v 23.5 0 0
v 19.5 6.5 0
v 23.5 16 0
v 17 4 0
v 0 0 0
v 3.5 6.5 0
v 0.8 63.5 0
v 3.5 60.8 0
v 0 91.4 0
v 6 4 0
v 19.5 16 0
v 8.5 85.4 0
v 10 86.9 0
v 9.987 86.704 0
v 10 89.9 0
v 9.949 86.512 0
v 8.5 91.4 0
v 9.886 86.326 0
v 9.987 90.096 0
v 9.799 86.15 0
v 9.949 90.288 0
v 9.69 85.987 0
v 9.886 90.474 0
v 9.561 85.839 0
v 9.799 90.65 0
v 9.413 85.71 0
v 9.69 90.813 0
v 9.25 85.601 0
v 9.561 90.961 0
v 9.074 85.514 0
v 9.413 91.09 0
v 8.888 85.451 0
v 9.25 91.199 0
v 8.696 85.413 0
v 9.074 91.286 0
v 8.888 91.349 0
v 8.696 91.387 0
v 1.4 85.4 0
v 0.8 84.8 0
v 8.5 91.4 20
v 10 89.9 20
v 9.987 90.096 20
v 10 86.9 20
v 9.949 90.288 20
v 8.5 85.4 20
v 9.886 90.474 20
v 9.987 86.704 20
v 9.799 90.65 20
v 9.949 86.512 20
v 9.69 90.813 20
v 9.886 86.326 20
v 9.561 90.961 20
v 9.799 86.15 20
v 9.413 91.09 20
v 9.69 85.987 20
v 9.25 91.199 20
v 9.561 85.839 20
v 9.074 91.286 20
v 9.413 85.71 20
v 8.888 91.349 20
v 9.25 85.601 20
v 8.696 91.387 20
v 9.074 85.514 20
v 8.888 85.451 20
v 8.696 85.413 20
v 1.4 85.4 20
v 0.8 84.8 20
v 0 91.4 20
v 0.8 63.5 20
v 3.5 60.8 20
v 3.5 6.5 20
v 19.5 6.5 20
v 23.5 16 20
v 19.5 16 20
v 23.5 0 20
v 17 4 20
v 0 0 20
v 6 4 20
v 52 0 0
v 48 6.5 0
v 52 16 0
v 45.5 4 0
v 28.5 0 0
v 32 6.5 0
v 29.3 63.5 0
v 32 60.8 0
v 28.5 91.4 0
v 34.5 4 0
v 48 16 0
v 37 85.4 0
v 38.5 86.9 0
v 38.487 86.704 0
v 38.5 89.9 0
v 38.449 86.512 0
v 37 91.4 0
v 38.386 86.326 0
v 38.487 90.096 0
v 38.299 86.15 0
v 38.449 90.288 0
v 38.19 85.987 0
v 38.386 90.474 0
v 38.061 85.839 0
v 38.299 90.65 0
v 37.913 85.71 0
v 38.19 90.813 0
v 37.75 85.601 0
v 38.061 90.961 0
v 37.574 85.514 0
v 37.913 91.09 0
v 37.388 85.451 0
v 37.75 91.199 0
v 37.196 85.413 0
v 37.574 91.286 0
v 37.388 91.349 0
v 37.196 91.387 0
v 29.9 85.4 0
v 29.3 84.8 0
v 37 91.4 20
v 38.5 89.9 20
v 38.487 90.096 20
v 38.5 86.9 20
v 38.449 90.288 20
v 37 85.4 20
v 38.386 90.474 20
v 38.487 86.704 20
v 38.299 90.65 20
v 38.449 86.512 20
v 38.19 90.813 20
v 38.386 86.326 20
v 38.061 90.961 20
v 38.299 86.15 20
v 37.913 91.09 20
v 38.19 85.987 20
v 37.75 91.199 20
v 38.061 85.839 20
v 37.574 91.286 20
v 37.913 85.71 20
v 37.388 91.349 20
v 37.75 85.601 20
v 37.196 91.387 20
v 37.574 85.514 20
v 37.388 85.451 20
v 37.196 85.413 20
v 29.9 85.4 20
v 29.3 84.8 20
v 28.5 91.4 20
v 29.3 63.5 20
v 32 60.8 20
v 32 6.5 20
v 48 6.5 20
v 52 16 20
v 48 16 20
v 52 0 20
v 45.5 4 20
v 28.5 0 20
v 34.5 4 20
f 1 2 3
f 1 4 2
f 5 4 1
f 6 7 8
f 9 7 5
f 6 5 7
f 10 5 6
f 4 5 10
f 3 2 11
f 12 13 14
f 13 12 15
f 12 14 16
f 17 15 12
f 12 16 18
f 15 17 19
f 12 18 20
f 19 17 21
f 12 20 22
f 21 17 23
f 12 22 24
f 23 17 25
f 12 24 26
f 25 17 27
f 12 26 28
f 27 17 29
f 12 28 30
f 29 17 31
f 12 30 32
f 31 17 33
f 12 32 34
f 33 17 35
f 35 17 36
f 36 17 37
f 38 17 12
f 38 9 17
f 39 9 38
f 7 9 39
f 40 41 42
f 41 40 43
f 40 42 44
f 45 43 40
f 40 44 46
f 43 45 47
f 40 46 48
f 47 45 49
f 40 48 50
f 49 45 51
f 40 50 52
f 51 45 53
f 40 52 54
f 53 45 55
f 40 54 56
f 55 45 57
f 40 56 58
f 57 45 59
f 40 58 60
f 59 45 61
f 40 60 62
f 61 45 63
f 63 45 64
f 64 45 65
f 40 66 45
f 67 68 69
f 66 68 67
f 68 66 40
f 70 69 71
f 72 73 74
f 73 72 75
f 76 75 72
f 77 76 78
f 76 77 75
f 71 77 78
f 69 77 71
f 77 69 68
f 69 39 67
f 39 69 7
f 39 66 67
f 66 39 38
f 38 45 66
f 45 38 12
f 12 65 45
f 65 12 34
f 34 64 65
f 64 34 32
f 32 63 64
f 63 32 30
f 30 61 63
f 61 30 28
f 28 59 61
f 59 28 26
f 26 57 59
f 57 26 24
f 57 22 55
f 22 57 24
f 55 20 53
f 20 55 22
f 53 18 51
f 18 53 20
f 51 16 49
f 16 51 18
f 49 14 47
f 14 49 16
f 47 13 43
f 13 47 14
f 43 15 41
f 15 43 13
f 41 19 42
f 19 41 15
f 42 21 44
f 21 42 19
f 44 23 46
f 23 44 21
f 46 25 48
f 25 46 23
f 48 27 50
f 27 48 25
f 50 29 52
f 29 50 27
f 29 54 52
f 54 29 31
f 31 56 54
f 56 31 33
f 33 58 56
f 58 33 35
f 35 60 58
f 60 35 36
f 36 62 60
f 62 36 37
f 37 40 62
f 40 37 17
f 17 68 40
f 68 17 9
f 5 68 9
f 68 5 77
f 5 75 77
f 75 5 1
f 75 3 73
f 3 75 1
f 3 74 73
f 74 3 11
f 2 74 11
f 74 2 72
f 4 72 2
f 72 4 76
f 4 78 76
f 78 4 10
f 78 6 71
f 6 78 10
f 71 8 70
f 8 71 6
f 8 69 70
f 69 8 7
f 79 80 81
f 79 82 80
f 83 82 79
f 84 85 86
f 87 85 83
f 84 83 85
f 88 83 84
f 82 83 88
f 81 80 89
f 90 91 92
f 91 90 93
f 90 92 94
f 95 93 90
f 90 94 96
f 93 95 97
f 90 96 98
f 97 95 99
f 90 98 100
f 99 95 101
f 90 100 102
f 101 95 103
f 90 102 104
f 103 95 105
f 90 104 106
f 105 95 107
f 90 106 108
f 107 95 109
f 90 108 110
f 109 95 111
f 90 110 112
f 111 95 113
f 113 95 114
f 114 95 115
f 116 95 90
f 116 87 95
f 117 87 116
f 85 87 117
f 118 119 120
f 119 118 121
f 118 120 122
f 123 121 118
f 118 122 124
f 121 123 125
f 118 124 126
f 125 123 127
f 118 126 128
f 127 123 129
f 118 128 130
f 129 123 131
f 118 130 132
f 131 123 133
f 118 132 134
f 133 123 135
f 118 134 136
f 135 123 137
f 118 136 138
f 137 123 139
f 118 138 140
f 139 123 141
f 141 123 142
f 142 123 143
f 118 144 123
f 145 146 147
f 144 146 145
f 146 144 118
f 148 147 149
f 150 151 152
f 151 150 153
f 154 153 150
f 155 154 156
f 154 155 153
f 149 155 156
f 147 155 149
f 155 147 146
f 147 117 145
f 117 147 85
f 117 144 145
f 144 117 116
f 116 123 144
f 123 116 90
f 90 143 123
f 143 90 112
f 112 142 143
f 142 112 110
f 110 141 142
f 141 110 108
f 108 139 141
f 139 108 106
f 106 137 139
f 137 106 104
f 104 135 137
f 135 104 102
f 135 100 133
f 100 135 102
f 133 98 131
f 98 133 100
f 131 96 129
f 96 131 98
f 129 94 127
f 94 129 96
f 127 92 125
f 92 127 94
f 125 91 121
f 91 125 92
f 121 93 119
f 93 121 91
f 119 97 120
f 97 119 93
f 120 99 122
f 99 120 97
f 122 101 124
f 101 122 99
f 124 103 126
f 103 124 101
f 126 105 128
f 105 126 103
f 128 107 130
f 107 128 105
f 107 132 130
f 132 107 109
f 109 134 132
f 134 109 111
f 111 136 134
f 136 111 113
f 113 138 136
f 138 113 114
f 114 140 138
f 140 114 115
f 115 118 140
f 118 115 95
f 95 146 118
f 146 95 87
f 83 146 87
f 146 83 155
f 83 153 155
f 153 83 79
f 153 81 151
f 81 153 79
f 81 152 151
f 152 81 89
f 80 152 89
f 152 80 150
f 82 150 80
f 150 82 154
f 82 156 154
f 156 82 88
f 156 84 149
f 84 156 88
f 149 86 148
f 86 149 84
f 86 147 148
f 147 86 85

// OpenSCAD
// =============================================================================
//  whiteboard_hanger.scad — Crochet pour suspendre un tableau blanc sous une
//                           tablette appuyée contre un mur
//  Unités : millimètres
// =============================================================================
//
//  Profil (vue de côté, mur à gauche, X = vers la pièce, Y = vers le haut) :
//
//        ┌──────────────┐  ← languette posée SUR la tablette (tab_len, tab_t)
//        │┌─────────────┴──────── tablette ───
//        ││  (shelf_t)
//        ││  ← bande mince (strip_t = 0.8) coincée entre mur et tablette
//        │└─────────────────────────────────
//        │ \  ← rampe à 45° : la bande s'épaissit SOUS la tablette
//        │  │
//        │  │  ← descente (drop_len, épaisseur below_t)
//        │  │
//        │  │ ┌─┐ ← lèvre (lip_h)
//        │  │ │ │
//        │  └─┘ │ ← fond du crochet : le haut du tableau repose ici
//        └──────┘   (largeur intérieure = board_t + board_clear)
//       mur
//
//  Tout est orthogonal (pas de courbes), avec de petits goussets à 45°
//  (fillet) dans les angles intérieurs pour la solidité.
//
//  IMPRESSION : couché sur le côté — le PROFIL est à plat sur le plateau et
//  la pièce est extrudée vers le haut sur `width` mm. Les lignes de couche
//  sont alors parallèles au profil : aucun pli ne se fend entre deux couches.
//  part = "print" exporte la pièce dans cette orientation (count exemplaires).
//  part = "preview" la montre en place, avec mur, tablette et tableau fantômes.
// =============================================================================

part  = "print";   // "print" = à plat, prêt à trancher ; "preview" = en place
count = 2;         // nombre d'exemplaires sur le plateau (mode print)

// ── Pièce ────────────────────────────────────────────────────────────────────
width       = 20;    // largeur du crochet (= hauteur d'impression)

// Bande contre le mur
strip_t     = 0.8;   // épaisseur de la partie coincée entre mur et tablette
                     // (≥ 2 lignes d'extrusion avec une buse de 0.4)

// Tablette et languette du haut
shelf_t     = 21.4;  // épaisseur de la tablette = longueur de la bande mince
                     // (25.4 au départ : la bande dépassait de 4 mm)
shelf_clear = 0.5;   // jeu vertical : la partie épaisse commence ce jeu sous la tablette
tab_len     = 10;    // longueur du bloc posé sur la tablette (depuis le mur) :
                     // il suffit qu'il accroche le bois
tab_t       = 6.0;   // hauteur du bloc : court et épais pour ne pas plier
                     // (2 mm × 25 mm se déformait sous la charge)
tab_lip_h   = 0;     // rebord descendant au bout de la languette (0 = aucun).
                     // Pour enserrer l'avant de la tablette :
                     //   tab_len = strip_t + profondeur de la tablette + jeu + tab_t

// Descente et crochet du bas
drop_len    = 60;    // du dessous de la tablette au fond intérieur du crochet
below_t     = 3.5;   // épaisseur de la bande sous la tablette (rigidité)
board_t     = 15;    // épaisseur du tableau (ou de son cadre)
board_clear = 1.0;   // jeu entre le tableau et la lèvre
hook_t      = 4.0;   // épaisseur du fond et de la lèvre du crochet
lip_h       = 12;    // hauteur de la lèvre (au-dessus du fond intérieur)

// Renforts
fillet      = 2.5;   // gousset à 45° dans les angles intérieurs du crochet et
                     // de la descente (0 = angles vifs)
top_fillet  = 0.6;   // gousset entre la bande mince et le bloc du haut. Il loge
                     // dans l'arête arrière-haut de la tablette : celle-ci doit
                     // être adoucie/poncée d'au moins cette valeur (sinon 0)
tab_round   = 1.5;   // rayon des deux arêtes avant du bloc du haut

// ── Fantômes (aperçu seulement) ───────────────────────────────────────────────
shelf_depth = 250;   // profondeur de la tablette
board_h     = 200;   // hauteur du tableau montrée dans l'aperçu
ghost_len   = 120;   // longueur des fantômes le long du mur

// ── Cotes dérivées (profil 2D) ────────────────────────────────────────────────
y_thin_bot = -(shelf_t + shelf_clear);          // fin de la partie mince
y_ramp_bot = y_thin_bot - (below_t - strip_t);  // fin de la rampe à 45°
y_floor    = -(shelf_t + drop_len);             // fond intérieur du crochet
y_floor_bot= y_floor - hook_t;
x_lip_in   = below_t + board_t + board_clear;
x_lip_out  = x_lip_in + hook_t;
y_lip_top  = y_floor + lip_h;

assert(below_t >= strip_t, "below_t doit être ≥ strip_t");
assert(y_floor < y_ramp_bot - fillet,
       "drop_len trop court : augmenter drop_len ou réduire shelf_clear/below_t");
assert(tab_len >= strip_t + tab_t, "tab_len trop court");

// ── Profil ───────────────────────────────────────────────────────────────────
module rect(x0, y0, x1, y1) translate([x0, y0]) square([x1 - x0, y1 - y0]);

// gousset triangulaire dans un angle intérieur ; sx, sy = sens des deux bras
module gusset(x, y, s, sx, sy)
    if (s > 0) polygon([[x, y], [x + sx * s, y], [x, y + sy * s]]);

// bloc du haut : rectangle dont les deux arêtes avant (haut et bas, celle
// du bas touche la tablette) sont arrondies
module knob_profile() {
    r = min(tab_round, tab_t / 2, tab_len);
    if (r <= 0) rect(0, 0, tab_len, tab_t);
    else hull() {
        rect(0, 0, tab_len - r, tab_t);
        for (y = [r, tab_t - r])
            translate([tab_len - r, y]) circle(r = r, $fn = 48);
    }
}

module profile() {
    union() {
        // languette du haut, posée sur la tablette
        // bloc du haut, posé sur la tablette, arêtes avant arrondies
        knob_profile();
        if (tab_lip_h > 0) rect(tab_len - tab_t, -tab_lip_h, tab_len, 0);
        // bande mince entre mur et tablette
        rect(0, y_thin_bot, strip_t, 0);
        // rampe à 45° vers l'épaisseur below_t
        polygon([[0, y_thin_bot], [strip_t, y_thin_bot],
                 [below_t, y_ramp_bot], [0, y_ramp_bot]]);
        // descente
        rect(0, y_floor_bot, below_t, y_ramp_bot);
        // fond et lèvre du crochet
        rect(0, y_floor_bot, x_lip_out, y_floor);
        rect(x_lip_in, y_floor_bot, x_lip_out, y_lip_top);

        // renforts
        gusset(below_t,  y_floor,  fillet,  1, 1);   // descente / fond
        gusset(x_lip_in, y_floor,  fillet, -1, 1);   // fond / lèvre
        gusset(strip_t,  0,        top_fillet,  1, -1);  // bande / languette
        if (tab_lip_h > 0)
            gusset(tab_len - tab_t, 0, top_fillet, -1, -1); // languette / rebord
    }
}

module hanger() linear_extrude(height = width) profile();

// ── Mise en place ─────────────────────────────────────────────────────────────
// profil X → Y monde (vers la pièce), profil Y → Z monde, largeur → X monde
module in_place() rotate([90, 0, 90]) children();

if (part == "print") {
    // à plat : profil sur le plateau, exemplaires côte à côte
    pitch = max(tab_len, x_lip_out) + 5;
    for (i = [0 : count - 1])
        translate([i * pitch, -y_floor_bot, 0]) hanger();
} else {
    color("SteelBlue") in_place() hanger();
    // mur
    %translate([-ghost_len / 2, -10, y_floor - board_h - 20])
        cube([ghost_len + width, 10, board_h + shelf_t + drop_len + 60]);
    // tablette
    %translate([-ghost_len / 2, strip_t, -shelf_t])
        cube([ghost_len + width, shelf_depth, shelf_t]);
    // tableau, son bord du haut posé dans le crochet
    %translate([-ghost_len / 2, below_t, y_floor - board_h])
        cube([ghost_len + width, board_t, board_h]);
}
